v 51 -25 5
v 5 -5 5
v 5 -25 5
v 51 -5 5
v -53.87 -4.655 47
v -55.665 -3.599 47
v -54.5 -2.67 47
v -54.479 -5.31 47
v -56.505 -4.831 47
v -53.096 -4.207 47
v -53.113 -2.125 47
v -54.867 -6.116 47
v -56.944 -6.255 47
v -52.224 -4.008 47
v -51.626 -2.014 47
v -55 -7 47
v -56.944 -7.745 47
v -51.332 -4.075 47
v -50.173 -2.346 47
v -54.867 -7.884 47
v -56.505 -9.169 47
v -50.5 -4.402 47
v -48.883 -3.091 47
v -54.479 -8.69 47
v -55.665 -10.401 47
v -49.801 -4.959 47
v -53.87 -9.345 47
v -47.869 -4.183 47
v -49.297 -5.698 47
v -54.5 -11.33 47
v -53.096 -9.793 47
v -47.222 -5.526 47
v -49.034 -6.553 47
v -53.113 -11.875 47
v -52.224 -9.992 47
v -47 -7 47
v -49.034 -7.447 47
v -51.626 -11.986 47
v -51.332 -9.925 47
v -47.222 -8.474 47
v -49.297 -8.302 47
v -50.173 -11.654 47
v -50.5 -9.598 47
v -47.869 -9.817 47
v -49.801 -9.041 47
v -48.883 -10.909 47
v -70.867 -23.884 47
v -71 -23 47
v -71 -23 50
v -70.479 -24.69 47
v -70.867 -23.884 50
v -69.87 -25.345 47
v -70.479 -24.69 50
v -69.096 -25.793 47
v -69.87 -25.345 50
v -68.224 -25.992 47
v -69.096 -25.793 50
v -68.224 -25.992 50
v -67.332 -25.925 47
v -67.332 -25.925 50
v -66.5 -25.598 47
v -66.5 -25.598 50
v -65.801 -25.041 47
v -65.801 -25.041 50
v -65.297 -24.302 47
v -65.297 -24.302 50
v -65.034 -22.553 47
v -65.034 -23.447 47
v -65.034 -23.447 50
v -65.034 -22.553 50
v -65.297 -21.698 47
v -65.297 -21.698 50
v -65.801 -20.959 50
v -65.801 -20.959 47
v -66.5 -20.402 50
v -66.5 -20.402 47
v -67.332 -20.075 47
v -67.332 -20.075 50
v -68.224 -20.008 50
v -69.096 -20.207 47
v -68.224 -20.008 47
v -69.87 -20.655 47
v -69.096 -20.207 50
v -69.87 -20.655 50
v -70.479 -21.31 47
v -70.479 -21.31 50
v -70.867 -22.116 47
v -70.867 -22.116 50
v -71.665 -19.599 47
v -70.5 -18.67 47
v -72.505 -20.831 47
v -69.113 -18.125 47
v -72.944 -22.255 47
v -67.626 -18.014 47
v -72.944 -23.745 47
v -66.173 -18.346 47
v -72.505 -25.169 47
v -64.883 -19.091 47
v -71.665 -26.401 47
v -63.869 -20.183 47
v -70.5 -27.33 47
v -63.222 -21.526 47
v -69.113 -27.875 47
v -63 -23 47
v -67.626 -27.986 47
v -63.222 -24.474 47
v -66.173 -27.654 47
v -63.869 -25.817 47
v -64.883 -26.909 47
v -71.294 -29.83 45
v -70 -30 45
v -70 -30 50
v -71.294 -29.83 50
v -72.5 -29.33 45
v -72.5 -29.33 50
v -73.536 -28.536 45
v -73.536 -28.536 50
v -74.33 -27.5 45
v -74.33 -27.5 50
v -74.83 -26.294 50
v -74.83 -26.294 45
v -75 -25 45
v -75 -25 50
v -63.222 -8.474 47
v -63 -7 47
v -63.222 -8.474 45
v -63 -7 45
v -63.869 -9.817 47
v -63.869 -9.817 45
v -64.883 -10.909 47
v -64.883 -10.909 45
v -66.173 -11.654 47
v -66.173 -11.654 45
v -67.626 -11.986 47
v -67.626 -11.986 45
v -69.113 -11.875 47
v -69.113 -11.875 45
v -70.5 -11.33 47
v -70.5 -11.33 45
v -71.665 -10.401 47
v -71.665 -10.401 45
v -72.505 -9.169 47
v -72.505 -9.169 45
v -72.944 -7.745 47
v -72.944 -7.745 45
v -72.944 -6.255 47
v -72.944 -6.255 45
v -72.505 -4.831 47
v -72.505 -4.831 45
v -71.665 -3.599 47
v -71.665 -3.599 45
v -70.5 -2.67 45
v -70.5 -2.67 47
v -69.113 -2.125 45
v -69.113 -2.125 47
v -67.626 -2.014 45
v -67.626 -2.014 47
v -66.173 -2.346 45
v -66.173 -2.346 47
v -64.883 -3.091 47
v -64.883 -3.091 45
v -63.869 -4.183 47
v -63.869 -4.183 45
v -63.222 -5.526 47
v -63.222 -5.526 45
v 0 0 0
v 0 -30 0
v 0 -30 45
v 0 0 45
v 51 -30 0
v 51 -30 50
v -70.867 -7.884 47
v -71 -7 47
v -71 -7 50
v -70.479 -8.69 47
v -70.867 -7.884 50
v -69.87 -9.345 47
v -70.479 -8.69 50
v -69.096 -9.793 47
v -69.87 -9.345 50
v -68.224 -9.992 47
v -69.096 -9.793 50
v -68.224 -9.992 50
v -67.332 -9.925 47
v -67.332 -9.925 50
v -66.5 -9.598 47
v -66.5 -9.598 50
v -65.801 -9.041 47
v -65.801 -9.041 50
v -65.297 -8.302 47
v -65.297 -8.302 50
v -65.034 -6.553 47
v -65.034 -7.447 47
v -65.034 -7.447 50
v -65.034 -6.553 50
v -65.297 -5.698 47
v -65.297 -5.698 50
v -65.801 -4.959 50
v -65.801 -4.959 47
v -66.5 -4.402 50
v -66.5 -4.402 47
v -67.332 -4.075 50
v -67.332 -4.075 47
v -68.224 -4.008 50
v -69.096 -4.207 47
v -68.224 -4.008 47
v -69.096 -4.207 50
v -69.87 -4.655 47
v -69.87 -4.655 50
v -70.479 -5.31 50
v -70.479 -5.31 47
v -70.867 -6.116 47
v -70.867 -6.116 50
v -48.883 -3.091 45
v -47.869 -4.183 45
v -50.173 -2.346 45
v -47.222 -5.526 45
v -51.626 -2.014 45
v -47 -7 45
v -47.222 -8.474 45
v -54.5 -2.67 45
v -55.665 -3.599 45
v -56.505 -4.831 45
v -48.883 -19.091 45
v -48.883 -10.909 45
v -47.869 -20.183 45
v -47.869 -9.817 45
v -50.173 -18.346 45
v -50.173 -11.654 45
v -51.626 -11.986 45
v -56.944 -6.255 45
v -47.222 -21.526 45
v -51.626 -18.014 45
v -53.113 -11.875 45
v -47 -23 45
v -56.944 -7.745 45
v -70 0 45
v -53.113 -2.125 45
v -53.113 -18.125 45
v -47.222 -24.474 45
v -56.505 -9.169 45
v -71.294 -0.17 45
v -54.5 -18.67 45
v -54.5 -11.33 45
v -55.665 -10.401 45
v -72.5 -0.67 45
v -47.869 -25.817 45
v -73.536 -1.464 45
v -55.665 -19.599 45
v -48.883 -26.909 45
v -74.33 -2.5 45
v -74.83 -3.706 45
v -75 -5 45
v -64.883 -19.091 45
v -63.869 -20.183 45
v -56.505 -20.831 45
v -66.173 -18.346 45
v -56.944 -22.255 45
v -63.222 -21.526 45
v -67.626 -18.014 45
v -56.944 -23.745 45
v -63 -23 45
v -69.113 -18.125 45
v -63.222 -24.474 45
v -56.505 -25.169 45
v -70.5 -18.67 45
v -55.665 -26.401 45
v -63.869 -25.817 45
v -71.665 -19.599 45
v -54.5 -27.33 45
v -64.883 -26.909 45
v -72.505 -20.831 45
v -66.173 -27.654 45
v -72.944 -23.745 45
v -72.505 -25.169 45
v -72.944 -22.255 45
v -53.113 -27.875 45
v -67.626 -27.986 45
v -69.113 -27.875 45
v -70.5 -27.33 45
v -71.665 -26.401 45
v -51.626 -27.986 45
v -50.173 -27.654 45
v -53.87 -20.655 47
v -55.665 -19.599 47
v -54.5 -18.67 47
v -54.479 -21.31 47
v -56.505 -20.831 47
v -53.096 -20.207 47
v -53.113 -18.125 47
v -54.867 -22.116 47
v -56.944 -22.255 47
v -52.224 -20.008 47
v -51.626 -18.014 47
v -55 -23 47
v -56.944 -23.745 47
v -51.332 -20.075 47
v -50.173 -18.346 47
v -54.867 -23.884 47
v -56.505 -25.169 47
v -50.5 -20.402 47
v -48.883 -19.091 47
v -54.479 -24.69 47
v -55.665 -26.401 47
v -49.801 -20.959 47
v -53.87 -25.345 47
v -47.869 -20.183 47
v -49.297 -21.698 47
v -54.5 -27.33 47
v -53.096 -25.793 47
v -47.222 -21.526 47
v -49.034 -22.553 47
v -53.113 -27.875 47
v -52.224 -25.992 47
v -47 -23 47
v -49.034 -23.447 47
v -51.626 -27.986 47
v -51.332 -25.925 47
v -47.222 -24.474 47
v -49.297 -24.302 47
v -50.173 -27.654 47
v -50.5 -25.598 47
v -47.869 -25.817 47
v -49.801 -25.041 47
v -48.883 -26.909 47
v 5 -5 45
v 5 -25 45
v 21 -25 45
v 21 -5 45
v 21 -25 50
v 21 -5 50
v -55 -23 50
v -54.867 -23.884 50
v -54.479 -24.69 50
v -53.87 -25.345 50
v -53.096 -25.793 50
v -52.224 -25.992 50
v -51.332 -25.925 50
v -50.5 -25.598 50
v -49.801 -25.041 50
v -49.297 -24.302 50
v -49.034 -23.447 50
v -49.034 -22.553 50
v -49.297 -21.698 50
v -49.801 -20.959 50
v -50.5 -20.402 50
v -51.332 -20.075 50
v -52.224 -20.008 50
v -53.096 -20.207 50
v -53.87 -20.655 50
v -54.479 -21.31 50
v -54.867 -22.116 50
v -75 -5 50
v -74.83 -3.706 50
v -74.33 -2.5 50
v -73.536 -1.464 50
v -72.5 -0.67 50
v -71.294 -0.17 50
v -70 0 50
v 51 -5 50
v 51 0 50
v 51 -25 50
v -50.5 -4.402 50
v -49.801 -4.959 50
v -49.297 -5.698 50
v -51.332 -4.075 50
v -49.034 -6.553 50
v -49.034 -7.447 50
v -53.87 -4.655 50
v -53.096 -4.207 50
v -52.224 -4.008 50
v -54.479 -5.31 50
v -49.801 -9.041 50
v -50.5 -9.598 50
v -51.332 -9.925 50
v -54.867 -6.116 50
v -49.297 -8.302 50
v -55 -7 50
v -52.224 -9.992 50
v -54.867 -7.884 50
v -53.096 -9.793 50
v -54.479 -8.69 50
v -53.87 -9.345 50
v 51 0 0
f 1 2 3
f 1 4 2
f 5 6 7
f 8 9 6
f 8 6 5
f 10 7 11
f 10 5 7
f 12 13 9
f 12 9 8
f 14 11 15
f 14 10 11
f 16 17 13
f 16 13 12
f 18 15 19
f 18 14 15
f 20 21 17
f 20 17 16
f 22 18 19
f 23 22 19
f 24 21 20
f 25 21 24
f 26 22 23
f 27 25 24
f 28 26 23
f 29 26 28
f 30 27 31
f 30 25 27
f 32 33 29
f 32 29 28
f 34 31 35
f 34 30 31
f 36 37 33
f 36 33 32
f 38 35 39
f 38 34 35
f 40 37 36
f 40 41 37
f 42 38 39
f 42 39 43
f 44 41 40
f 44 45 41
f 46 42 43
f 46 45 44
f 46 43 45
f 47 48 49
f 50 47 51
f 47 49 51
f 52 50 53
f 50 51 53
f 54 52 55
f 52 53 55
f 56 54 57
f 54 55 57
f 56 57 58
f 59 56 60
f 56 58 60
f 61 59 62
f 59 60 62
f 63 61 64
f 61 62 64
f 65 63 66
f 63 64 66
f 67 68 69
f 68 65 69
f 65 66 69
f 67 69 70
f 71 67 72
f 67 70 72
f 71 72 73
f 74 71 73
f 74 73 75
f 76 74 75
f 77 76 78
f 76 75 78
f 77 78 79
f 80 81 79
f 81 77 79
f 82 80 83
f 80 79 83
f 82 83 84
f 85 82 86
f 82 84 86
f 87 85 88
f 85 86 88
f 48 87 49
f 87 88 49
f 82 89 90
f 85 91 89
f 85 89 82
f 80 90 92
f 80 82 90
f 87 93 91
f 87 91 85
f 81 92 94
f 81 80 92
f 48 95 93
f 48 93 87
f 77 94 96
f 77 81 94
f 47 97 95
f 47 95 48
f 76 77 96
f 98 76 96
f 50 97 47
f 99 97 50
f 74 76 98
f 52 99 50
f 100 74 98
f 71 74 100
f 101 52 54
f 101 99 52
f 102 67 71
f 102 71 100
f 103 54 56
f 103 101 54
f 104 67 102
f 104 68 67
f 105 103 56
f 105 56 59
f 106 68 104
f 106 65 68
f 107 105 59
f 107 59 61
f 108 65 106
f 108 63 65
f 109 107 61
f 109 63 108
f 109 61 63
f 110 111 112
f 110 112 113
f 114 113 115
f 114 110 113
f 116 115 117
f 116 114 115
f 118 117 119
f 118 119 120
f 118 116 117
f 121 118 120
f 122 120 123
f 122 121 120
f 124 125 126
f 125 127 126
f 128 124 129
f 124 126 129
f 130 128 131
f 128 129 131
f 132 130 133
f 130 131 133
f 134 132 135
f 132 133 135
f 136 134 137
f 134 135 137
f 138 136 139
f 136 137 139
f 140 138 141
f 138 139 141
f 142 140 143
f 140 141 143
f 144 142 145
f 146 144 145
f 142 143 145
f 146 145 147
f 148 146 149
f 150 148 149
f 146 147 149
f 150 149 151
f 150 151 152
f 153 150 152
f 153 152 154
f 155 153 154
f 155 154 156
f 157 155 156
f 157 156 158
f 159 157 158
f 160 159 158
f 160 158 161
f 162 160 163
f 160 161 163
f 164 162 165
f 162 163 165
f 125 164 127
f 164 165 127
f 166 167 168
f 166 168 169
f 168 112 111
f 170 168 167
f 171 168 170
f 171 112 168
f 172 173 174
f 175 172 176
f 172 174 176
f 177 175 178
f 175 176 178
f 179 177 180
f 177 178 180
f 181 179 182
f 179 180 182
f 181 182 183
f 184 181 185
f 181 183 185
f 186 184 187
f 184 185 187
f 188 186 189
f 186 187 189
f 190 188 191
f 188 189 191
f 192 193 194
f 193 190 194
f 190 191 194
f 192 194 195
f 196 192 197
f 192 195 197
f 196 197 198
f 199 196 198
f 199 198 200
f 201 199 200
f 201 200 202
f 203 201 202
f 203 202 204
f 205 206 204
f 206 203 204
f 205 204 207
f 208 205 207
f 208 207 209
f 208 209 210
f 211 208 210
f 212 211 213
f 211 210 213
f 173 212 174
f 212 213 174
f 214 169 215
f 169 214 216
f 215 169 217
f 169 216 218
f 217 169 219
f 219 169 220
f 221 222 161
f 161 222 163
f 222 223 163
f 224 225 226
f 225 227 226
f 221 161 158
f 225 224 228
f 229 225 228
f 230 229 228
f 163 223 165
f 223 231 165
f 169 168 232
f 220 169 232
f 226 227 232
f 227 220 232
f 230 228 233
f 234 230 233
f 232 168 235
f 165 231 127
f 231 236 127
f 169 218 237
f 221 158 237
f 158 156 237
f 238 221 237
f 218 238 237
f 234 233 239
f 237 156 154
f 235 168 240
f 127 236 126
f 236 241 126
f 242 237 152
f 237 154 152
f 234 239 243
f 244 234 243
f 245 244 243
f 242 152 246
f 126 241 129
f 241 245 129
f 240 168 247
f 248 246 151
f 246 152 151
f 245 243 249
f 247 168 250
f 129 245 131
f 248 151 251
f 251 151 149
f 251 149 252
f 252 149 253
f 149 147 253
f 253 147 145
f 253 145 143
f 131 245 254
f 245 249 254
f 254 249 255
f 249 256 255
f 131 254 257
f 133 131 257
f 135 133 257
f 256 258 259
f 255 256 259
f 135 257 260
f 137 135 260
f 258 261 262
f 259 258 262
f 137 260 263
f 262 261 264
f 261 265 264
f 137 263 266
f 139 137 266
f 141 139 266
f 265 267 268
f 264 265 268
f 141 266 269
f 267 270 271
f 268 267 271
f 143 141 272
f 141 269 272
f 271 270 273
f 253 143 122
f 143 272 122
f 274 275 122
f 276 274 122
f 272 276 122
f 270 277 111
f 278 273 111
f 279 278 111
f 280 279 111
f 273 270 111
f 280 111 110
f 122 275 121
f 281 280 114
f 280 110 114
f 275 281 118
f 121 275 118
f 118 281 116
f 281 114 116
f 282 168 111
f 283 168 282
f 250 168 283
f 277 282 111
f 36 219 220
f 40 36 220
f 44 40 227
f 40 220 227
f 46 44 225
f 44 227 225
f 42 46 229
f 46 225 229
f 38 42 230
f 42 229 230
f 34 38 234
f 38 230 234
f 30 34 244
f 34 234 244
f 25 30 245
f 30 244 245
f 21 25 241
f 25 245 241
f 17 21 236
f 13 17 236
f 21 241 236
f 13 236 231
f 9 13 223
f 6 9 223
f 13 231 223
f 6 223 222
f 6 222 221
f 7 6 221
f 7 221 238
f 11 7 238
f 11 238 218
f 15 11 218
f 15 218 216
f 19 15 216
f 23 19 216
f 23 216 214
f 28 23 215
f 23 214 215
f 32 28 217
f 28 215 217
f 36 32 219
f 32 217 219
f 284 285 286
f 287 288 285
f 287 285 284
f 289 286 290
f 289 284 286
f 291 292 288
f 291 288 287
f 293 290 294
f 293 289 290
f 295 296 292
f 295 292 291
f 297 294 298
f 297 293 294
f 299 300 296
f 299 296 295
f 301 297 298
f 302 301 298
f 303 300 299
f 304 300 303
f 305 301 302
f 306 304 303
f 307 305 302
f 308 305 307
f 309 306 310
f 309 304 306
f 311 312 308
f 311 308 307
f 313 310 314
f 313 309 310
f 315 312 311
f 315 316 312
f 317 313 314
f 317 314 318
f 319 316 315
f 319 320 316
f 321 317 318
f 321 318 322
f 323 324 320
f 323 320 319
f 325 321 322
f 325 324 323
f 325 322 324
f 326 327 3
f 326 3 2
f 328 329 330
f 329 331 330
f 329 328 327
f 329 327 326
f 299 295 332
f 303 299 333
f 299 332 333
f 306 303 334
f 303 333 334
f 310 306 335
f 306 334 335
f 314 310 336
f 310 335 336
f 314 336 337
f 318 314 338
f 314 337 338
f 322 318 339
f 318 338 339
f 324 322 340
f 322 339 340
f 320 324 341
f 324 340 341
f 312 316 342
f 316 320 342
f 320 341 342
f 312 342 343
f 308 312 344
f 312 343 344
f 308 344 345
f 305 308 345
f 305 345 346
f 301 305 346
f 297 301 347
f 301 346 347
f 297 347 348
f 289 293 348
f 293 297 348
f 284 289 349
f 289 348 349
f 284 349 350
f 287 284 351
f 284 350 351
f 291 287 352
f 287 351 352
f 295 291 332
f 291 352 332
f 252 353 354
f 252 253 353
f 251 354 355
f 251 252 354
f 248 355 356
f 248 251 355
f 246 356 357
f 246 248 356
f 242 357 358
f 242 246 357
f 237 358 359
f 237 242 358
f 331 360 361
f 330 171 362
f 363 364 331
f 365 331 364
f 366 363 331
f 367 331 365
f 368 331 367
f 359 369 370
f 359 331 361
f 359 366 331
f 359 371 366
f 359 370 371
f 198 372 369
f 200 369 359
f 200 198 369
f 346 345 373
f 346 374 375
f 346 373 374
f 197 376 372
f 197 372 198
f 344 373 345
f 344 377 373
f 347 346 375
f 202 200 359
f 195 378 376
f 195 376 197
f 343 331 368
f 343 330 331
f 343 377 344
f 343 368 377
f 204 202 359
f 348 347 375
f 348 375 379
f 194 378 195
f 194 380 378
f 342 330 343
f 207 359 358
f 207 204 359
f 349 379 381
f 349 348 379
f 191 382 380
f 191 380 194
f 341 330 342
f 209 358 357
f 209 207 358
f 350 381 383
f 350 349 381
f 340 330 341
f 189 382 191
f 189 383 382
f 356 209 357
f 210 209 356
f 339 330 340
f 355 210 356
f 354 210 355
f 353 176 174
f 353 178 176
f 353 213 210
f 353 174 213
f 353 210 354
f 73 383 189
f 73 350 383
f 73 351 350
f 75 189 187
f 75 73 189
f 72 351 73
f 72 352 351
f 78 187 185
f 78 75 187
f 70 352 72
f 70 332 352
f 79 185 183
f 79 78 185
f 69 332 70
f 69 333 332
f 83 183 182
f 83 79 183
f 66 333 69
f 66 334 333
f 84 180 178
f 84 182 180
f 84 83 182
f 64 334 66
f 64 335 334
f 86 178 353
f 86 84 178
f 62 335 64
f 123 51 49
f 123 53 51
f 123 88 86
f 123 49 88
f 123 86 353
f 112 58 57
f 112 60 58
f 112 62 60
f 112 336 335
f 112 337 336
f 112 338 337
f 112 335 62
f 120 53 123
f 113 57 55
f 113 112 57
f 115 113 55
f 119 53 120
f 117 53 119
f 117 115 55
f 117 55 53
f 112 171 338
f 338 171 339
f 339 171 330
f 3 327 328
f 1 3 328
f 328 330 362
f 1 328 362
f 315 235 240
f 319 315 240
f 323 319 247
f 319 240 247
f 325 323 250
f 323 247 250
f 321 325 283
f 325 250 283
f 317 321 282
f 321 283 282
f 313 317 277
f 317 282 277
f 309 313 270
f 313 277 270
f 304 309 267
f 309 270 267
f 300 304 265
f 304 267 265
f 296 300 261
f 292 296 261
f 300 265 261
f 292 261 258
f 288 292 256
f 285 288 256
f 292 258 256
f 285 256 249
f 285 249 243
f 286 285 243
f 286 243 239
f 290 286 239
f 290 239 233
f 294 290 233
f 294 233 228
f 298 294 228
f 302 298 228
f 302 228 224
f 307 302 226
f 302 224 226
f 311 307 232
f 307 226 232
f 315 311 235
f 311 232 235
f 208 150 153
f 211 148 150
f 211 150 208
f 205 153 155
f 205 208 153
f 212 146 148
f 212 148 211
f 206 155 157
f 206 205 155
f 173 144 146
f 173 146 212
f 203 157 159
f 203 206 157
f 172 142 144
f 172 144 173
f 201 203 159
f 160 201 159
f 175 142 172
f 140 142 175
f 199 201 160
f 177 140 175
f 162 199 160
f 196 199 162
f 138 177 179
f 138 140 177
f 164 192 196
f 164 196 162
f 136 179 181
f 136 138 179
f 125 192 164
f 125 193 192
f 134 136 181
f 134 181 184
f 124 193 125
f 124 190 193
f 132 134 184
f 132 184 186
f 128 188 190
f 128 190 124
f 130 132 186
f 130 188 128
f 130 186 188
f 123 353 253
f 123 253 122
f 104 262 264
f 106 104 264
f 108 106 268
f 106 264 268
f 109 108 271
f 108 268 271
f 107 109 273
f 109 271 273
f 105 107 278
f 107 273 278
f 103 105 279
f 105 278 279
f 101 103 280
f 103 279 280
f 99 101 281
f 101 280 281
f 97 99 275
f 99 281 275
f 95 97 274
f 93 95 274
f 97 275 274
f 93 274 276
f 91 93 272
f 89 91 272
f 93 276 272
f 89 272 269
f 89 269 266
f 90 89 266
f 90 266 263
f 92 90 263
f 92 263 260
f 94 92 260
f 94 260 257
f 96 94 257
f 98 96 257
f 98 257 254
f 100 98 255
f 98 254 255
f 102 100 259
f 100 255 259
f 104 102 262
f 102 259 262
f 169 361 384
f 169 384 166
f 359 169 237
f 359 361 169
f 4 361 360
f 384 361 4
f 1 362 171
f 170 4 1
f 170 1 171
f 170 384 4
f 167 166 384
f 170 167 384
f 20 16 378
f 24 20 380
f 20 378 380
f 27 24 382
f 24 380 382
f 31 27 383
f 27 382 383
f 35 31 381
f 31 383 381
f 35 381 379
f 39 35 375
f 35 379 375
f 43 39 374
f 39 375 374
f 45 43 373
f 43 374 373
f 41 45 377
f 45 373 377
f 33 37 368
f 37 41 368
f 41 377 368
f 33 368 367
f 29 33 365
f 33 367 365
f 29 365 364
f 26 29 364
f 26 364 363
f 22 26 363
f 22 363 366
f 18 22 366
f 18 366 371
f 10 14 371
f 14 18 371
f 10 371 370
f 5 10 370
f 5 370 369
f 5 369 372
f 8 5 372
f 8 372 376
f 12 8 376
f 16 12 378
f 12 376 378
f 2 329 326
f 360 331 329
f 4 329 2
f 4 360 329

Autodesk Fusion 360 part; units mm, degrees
sketch "Sketch1" plane through (0, 0, 0) normal (0, 0, 1) x (1, 0, 0)
  line L0 (0, 0) -> (51, 0)
  line L1 (51, 0) -> (51, -30)
  line L2 (51, -30) -> (0, -30)
  line L3 (0, -30) -> (0, 0)
  dimension "d1" = 51
  dimension "d2" = 30
extrude "Extrude1" add sketch "Sketch1" along normal blind 50
sketch "Sketch2" plane through (51, 0, 0) normal (1, 0, 0) x (0, 1, 0)
  line L0 (-30, 0) -> (0, 0)
  line L1 (0, 0) -> (0, 50)
  line L2 (0, 50) -> (-30, 50)
  line L3 (-30, 50) -> (-30, 0)
  line L4 (-5, 5) -> (-25, 5)
  line L5 (-25, 5) -> (-25, 45)
  line L6 (-25, 45) -> (-5, 45)
  line L7 (-5, 45) -> (-5, 5)
  dimension "d5" = 20
  dimension "d6" = 40
extrude "Extrude2" cut sketch "Sketch2" against normal blind 46 contours L4 L5 L6 L7
sketch "Sketch3" plane through (0, 0, 50) normal (0, 0, 1) x (-1, 0, 0)
  line L0 (0, 30) -> (-51, 30)
  line L1 (-51, 30) -> (-51, 0)
  line L2 (-51, 0) -> (0, 0)
  line L3 (0, 0) -> (0, 30)
  line L4 (-51, 5) -> (-21, 5)
  line L5 (-21, 5) -> (-21, 25)
  line L6 (-21, 25) -> (-51, 25)
  line L7 (-51, 25) -> (-51, 5)
  dimension "d9" = 30
  dimension "d10" = 20
extrude "Extrude3" cut sketch "Sketch3" against normal blind 6 contours L1 L4 L5 L6 L7
sketch "Sketch4" plane through (0, 0, 50) normal (0, 0, 1) x (-1, 0, 0)
  line L0 (-51, 25) -> (-21, 25)
  line L1 (-21, 25) -> (-21, 5)
  line L2 (-21, 5) -> (-51, 5)
  line L3 (-51, 5) -> (-51, 0)
  line L4 (-51, 0) -> (0, 0)
  line L5 (0, 0) -> (0, 30)
  line L6 (0, 30) -> (-51, 30)
  line L7 (-51, 30) -> (-51, 25)
  line L8 (0, 0) -> (75, 0)
  line L9 (75, 0) -> (75, 30)
  line L10 (75, 30) -> (0, 30)
  line L11 (0, 30) -> (0, 0)
  dimension "d13" = 75
  dimension "d14" = 30
extrude "Extrude4" add sketch "Sketch4" against normal blind 5 contours L5 L8 L9 L10 L11
sketch "Sketch5" plane through (0, 0, 50) normal (0, 0, 1) x (-1, 0, 0)
  line L0 (-51, 25) -> (-21, 25)
  line L1 (-21, 25) -> (-21, 5)
  line L2 (-21, 5) -> (-51, 5)
  line L3 (-51, 5) -> (-51, 0)
  line L4 (-51, 0) -> (75, 0)
  line L5 (75, 0) -> (75, 30)
  line L6 (75, 30) -> (-51, 30)
  line L7 (-51, 30) -> (-51, 25)
  circle A0 centre (68, 7) radius 3
  circle A1 centre (68, 23) radius 3
  circle A2 centre (52, 7) radius 3
  circle A3 centre (52, 23) radius 3
  dimension "d17" = 6
  dimension "d18" = 6
  dimension "d19" = 6
  dimension "d20" = 6
extrude "Extrude5" cut sketch "Sketch5" against normal blind 5 contours A0 | A1 | A2 | A3
sketch "Sketch6" plane through (0, 0, 45) normal (0, 0, -1) x (1, 0, 0)
  circle A0 centre (-68, 23) radius 3
  circle A1 centre (-68, 7) radius 3
  circle A2 centre (-52, 23) radius 3
  circle A3 centre (-52, 7) radius 3
  line L0 (0, 0) -> (0, 30)
  line L1 (0, 30) -> (-75, 30)
  line L2 (-75, 30) -> (-75, 0)
  line L3 (-75, 0) -> (0, 0)
  circle A4 centre (-68, 23) radius 5
  circle A5 centre (-52, 23) radius 5
  circle A6 centre (-68, 7) radius 5
  circle A7 centre (-52, 7) radius 5
  dimension "d23" = 10
  dimension "d24" = 10
  dimension "d25" = 10
  dimension "d26" = 10
extrude "Extrude6" cut sketch "Sketch6" against normal blind 2 contours A4 | A5 | A6 | A7
fillet "Fillet1" radius 5 2 edges at (-75, -30, 47.5) (-75, 0, 47.5)
